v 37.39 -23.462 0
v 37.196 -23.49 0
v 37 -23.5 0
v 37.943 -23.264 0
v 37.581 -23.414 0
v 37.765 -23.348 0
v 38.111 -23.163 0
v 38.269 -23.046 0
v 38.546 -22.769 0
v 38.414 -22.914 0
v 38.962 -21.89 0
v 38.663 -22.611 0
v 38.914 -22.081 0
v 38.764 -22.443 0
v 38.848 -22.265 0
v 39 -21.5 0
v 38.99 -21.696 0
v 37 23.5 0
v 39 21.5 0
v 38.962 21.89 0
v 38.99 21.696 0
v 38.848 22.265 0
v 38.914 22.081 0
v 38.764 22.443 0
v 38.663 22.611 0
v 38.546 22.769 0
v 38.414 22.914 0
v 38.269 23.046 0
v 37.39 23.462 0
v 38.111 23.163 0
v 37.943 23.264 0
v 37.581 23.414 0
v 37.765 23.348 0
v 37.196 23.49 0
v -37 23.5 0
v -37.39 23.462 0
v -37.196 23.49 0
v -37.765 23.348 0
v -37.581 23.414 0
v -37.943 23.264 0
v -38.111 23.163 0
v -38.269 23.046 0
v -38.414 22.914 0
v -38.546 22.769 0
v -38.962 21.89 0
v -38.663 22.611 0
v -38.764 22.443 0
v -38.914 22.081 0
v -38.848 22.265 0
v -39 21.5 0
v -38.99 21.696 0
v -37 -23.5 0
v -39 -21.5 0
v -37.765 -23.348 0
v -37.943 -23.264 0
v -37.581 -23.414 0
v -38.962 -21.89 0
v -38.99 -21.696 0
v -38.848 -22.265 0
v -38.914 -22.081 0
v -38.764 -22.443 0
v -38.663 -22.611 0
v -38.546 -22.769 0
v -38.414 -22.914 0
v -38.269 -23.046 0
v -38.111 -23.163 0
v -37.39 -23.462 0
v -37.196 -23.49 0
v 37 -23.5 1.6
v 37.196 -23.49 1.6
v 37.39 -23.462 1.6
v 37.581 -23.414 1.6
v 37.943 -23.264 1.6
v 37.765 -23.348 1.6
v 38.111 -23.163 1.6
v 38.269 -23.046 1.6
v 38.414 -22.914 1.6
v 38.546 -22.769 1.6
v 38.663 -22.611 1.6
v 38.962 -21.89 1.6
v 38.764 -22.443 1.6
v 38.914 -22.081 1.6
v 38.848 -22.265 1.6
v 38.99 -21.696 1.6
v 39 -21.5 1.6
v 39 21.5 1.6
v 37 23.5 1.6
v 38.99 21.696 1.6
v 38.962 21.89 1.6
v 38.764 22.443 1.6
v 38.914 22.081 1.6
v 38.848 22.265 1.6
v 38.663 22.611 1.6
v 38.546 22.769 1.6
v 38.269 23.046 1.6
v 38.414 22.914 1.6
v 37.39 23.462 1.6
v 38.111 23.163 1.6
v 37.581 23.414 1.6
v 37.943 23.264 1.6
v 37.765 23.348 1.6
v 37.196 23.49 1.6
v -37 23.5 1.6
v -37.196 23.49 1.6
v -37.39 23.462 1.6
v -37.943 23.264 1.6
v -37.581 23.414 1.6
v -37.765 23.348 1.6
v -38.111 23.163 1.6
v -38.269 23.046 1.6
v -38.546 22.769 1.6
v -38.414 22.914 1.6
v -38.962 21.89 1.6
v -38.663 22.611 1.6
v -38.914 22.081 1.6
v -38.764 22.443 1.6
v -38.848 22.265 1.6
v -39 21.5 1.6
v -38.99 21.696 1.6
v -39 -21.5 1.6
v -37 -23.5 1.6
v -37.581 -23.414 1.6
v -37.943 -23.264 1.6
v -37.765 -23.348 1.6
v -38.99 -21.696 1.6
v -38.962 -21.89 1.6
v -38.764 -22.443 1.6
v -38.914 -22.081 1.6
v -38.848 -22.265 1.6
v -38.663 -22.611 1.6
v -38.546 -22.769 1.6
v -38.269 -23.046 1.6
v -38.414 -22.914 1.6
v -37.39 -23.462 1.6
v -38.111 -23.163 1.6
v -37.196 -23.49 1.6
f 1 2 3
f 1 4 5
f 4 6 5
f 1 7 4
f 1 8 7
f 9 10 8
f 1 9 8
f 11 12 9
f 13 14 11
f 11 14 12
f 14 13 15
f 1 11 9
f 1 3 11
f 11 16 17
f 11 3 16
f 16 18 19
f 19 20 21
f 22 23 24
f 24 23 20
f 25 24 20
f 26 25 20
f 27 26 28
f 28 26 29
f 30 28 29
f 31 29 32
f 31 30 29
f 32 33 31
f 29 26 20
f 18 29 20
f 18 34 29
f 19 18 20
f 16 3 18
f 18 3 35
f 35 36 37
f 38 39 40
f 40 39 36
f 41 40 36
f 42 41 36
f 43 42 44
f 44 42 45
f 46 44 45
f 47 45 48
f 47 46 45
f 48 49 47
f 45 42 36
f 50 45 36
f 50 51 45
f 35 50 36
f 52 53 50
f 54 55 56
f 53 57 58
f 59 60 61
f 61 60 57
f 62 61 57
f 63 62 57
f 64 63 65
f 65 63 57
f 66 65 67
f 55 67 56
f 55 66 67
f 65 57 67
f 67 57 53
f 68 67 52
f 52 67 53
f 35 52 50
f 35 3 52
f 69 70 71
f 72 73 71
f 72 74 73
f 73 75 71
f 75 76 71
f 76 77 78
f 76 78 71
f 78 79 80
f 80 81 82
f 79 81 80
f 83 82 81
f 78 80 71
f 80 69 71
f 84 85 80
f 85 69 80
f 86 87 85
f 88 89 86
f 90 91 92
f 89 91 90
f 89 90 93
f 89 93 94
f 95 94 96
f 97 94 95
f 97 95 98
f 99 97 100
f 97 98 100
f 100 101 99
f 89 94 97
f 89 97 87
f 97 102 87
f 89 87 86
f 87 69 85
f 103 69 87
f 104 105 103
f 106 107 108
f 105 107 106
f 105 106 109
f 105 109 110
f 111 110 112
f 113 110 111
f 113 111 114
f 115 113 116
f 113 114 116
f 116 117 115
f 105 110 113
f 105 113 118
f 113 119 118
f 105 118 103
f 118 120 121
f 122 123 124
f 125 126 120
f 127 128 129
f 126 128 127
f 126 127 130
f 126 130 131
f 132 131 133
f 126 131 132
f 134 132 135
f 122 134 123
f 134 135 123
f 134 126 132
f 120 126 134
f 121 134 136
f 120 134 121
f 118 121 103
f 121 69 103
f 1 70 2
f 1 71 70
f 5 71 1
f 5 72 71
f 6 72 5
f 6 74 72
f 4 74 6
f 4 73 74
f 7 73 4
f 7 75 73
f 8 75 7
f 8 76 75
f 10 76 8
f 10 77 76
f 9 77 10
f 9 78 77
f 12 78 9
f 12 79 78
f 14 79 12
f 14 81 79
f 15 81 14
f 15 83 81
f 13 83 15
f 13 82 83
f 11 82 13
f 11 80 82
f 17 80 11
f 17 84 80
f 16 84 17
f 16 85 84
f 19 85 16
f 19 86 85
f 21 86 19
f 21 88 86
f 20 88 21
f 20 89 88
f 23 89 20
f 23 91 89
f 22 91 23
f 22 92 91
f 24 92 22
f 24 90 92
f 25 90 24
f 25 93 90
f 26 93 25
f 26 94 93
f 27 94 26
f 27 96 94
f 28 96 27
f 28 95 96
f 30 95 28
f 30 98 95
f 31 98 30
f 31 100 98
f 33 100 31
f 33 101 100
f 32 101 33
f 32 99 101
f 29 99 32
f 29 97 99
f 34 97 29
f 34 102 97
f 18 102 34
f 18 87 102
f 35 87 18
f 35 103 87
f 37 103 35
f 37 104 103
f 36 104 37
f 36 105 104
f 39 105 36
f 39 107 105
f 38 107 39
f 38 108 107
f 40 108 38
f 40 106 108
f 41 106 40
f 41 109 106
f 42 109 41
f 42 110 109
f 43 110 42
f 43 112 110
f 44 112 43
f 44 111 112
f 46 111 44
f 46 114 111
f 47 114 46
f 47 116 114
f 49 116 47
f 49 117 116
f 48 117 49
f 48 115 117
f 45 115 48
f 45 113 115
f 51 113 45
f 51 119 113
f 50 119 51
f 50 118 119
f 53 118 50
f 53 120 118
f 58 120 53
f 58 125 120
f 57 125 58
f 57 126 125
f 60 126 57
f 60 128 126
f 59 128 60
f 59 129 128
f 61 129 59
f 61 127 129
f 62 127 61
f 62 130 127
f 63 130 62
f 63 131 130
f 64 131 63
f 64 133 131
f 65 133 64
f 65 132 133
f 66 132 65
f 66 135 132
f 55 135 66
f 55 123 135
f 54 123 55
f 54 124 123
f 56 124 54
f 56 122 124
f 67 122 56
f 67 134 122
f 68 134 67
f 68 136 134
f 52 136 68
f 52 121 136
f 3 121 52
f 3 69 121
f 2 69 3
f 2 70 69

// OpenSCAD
$fn = 64;

module dcdc_power_converter_module(
    length = 78.0,
    width  = 47.0,
    thickness = 1.6,
    corner_radius = 2.0
){
    corner_radius = min(corner_radius, min(length, width)/2);

    linear_extrude(height = thickness)
        offset(r = corner_radius)
            square([length - 2*corner_radius, width - 2*corner_radius], center = true);
}

dcdc_power_converter_module();
